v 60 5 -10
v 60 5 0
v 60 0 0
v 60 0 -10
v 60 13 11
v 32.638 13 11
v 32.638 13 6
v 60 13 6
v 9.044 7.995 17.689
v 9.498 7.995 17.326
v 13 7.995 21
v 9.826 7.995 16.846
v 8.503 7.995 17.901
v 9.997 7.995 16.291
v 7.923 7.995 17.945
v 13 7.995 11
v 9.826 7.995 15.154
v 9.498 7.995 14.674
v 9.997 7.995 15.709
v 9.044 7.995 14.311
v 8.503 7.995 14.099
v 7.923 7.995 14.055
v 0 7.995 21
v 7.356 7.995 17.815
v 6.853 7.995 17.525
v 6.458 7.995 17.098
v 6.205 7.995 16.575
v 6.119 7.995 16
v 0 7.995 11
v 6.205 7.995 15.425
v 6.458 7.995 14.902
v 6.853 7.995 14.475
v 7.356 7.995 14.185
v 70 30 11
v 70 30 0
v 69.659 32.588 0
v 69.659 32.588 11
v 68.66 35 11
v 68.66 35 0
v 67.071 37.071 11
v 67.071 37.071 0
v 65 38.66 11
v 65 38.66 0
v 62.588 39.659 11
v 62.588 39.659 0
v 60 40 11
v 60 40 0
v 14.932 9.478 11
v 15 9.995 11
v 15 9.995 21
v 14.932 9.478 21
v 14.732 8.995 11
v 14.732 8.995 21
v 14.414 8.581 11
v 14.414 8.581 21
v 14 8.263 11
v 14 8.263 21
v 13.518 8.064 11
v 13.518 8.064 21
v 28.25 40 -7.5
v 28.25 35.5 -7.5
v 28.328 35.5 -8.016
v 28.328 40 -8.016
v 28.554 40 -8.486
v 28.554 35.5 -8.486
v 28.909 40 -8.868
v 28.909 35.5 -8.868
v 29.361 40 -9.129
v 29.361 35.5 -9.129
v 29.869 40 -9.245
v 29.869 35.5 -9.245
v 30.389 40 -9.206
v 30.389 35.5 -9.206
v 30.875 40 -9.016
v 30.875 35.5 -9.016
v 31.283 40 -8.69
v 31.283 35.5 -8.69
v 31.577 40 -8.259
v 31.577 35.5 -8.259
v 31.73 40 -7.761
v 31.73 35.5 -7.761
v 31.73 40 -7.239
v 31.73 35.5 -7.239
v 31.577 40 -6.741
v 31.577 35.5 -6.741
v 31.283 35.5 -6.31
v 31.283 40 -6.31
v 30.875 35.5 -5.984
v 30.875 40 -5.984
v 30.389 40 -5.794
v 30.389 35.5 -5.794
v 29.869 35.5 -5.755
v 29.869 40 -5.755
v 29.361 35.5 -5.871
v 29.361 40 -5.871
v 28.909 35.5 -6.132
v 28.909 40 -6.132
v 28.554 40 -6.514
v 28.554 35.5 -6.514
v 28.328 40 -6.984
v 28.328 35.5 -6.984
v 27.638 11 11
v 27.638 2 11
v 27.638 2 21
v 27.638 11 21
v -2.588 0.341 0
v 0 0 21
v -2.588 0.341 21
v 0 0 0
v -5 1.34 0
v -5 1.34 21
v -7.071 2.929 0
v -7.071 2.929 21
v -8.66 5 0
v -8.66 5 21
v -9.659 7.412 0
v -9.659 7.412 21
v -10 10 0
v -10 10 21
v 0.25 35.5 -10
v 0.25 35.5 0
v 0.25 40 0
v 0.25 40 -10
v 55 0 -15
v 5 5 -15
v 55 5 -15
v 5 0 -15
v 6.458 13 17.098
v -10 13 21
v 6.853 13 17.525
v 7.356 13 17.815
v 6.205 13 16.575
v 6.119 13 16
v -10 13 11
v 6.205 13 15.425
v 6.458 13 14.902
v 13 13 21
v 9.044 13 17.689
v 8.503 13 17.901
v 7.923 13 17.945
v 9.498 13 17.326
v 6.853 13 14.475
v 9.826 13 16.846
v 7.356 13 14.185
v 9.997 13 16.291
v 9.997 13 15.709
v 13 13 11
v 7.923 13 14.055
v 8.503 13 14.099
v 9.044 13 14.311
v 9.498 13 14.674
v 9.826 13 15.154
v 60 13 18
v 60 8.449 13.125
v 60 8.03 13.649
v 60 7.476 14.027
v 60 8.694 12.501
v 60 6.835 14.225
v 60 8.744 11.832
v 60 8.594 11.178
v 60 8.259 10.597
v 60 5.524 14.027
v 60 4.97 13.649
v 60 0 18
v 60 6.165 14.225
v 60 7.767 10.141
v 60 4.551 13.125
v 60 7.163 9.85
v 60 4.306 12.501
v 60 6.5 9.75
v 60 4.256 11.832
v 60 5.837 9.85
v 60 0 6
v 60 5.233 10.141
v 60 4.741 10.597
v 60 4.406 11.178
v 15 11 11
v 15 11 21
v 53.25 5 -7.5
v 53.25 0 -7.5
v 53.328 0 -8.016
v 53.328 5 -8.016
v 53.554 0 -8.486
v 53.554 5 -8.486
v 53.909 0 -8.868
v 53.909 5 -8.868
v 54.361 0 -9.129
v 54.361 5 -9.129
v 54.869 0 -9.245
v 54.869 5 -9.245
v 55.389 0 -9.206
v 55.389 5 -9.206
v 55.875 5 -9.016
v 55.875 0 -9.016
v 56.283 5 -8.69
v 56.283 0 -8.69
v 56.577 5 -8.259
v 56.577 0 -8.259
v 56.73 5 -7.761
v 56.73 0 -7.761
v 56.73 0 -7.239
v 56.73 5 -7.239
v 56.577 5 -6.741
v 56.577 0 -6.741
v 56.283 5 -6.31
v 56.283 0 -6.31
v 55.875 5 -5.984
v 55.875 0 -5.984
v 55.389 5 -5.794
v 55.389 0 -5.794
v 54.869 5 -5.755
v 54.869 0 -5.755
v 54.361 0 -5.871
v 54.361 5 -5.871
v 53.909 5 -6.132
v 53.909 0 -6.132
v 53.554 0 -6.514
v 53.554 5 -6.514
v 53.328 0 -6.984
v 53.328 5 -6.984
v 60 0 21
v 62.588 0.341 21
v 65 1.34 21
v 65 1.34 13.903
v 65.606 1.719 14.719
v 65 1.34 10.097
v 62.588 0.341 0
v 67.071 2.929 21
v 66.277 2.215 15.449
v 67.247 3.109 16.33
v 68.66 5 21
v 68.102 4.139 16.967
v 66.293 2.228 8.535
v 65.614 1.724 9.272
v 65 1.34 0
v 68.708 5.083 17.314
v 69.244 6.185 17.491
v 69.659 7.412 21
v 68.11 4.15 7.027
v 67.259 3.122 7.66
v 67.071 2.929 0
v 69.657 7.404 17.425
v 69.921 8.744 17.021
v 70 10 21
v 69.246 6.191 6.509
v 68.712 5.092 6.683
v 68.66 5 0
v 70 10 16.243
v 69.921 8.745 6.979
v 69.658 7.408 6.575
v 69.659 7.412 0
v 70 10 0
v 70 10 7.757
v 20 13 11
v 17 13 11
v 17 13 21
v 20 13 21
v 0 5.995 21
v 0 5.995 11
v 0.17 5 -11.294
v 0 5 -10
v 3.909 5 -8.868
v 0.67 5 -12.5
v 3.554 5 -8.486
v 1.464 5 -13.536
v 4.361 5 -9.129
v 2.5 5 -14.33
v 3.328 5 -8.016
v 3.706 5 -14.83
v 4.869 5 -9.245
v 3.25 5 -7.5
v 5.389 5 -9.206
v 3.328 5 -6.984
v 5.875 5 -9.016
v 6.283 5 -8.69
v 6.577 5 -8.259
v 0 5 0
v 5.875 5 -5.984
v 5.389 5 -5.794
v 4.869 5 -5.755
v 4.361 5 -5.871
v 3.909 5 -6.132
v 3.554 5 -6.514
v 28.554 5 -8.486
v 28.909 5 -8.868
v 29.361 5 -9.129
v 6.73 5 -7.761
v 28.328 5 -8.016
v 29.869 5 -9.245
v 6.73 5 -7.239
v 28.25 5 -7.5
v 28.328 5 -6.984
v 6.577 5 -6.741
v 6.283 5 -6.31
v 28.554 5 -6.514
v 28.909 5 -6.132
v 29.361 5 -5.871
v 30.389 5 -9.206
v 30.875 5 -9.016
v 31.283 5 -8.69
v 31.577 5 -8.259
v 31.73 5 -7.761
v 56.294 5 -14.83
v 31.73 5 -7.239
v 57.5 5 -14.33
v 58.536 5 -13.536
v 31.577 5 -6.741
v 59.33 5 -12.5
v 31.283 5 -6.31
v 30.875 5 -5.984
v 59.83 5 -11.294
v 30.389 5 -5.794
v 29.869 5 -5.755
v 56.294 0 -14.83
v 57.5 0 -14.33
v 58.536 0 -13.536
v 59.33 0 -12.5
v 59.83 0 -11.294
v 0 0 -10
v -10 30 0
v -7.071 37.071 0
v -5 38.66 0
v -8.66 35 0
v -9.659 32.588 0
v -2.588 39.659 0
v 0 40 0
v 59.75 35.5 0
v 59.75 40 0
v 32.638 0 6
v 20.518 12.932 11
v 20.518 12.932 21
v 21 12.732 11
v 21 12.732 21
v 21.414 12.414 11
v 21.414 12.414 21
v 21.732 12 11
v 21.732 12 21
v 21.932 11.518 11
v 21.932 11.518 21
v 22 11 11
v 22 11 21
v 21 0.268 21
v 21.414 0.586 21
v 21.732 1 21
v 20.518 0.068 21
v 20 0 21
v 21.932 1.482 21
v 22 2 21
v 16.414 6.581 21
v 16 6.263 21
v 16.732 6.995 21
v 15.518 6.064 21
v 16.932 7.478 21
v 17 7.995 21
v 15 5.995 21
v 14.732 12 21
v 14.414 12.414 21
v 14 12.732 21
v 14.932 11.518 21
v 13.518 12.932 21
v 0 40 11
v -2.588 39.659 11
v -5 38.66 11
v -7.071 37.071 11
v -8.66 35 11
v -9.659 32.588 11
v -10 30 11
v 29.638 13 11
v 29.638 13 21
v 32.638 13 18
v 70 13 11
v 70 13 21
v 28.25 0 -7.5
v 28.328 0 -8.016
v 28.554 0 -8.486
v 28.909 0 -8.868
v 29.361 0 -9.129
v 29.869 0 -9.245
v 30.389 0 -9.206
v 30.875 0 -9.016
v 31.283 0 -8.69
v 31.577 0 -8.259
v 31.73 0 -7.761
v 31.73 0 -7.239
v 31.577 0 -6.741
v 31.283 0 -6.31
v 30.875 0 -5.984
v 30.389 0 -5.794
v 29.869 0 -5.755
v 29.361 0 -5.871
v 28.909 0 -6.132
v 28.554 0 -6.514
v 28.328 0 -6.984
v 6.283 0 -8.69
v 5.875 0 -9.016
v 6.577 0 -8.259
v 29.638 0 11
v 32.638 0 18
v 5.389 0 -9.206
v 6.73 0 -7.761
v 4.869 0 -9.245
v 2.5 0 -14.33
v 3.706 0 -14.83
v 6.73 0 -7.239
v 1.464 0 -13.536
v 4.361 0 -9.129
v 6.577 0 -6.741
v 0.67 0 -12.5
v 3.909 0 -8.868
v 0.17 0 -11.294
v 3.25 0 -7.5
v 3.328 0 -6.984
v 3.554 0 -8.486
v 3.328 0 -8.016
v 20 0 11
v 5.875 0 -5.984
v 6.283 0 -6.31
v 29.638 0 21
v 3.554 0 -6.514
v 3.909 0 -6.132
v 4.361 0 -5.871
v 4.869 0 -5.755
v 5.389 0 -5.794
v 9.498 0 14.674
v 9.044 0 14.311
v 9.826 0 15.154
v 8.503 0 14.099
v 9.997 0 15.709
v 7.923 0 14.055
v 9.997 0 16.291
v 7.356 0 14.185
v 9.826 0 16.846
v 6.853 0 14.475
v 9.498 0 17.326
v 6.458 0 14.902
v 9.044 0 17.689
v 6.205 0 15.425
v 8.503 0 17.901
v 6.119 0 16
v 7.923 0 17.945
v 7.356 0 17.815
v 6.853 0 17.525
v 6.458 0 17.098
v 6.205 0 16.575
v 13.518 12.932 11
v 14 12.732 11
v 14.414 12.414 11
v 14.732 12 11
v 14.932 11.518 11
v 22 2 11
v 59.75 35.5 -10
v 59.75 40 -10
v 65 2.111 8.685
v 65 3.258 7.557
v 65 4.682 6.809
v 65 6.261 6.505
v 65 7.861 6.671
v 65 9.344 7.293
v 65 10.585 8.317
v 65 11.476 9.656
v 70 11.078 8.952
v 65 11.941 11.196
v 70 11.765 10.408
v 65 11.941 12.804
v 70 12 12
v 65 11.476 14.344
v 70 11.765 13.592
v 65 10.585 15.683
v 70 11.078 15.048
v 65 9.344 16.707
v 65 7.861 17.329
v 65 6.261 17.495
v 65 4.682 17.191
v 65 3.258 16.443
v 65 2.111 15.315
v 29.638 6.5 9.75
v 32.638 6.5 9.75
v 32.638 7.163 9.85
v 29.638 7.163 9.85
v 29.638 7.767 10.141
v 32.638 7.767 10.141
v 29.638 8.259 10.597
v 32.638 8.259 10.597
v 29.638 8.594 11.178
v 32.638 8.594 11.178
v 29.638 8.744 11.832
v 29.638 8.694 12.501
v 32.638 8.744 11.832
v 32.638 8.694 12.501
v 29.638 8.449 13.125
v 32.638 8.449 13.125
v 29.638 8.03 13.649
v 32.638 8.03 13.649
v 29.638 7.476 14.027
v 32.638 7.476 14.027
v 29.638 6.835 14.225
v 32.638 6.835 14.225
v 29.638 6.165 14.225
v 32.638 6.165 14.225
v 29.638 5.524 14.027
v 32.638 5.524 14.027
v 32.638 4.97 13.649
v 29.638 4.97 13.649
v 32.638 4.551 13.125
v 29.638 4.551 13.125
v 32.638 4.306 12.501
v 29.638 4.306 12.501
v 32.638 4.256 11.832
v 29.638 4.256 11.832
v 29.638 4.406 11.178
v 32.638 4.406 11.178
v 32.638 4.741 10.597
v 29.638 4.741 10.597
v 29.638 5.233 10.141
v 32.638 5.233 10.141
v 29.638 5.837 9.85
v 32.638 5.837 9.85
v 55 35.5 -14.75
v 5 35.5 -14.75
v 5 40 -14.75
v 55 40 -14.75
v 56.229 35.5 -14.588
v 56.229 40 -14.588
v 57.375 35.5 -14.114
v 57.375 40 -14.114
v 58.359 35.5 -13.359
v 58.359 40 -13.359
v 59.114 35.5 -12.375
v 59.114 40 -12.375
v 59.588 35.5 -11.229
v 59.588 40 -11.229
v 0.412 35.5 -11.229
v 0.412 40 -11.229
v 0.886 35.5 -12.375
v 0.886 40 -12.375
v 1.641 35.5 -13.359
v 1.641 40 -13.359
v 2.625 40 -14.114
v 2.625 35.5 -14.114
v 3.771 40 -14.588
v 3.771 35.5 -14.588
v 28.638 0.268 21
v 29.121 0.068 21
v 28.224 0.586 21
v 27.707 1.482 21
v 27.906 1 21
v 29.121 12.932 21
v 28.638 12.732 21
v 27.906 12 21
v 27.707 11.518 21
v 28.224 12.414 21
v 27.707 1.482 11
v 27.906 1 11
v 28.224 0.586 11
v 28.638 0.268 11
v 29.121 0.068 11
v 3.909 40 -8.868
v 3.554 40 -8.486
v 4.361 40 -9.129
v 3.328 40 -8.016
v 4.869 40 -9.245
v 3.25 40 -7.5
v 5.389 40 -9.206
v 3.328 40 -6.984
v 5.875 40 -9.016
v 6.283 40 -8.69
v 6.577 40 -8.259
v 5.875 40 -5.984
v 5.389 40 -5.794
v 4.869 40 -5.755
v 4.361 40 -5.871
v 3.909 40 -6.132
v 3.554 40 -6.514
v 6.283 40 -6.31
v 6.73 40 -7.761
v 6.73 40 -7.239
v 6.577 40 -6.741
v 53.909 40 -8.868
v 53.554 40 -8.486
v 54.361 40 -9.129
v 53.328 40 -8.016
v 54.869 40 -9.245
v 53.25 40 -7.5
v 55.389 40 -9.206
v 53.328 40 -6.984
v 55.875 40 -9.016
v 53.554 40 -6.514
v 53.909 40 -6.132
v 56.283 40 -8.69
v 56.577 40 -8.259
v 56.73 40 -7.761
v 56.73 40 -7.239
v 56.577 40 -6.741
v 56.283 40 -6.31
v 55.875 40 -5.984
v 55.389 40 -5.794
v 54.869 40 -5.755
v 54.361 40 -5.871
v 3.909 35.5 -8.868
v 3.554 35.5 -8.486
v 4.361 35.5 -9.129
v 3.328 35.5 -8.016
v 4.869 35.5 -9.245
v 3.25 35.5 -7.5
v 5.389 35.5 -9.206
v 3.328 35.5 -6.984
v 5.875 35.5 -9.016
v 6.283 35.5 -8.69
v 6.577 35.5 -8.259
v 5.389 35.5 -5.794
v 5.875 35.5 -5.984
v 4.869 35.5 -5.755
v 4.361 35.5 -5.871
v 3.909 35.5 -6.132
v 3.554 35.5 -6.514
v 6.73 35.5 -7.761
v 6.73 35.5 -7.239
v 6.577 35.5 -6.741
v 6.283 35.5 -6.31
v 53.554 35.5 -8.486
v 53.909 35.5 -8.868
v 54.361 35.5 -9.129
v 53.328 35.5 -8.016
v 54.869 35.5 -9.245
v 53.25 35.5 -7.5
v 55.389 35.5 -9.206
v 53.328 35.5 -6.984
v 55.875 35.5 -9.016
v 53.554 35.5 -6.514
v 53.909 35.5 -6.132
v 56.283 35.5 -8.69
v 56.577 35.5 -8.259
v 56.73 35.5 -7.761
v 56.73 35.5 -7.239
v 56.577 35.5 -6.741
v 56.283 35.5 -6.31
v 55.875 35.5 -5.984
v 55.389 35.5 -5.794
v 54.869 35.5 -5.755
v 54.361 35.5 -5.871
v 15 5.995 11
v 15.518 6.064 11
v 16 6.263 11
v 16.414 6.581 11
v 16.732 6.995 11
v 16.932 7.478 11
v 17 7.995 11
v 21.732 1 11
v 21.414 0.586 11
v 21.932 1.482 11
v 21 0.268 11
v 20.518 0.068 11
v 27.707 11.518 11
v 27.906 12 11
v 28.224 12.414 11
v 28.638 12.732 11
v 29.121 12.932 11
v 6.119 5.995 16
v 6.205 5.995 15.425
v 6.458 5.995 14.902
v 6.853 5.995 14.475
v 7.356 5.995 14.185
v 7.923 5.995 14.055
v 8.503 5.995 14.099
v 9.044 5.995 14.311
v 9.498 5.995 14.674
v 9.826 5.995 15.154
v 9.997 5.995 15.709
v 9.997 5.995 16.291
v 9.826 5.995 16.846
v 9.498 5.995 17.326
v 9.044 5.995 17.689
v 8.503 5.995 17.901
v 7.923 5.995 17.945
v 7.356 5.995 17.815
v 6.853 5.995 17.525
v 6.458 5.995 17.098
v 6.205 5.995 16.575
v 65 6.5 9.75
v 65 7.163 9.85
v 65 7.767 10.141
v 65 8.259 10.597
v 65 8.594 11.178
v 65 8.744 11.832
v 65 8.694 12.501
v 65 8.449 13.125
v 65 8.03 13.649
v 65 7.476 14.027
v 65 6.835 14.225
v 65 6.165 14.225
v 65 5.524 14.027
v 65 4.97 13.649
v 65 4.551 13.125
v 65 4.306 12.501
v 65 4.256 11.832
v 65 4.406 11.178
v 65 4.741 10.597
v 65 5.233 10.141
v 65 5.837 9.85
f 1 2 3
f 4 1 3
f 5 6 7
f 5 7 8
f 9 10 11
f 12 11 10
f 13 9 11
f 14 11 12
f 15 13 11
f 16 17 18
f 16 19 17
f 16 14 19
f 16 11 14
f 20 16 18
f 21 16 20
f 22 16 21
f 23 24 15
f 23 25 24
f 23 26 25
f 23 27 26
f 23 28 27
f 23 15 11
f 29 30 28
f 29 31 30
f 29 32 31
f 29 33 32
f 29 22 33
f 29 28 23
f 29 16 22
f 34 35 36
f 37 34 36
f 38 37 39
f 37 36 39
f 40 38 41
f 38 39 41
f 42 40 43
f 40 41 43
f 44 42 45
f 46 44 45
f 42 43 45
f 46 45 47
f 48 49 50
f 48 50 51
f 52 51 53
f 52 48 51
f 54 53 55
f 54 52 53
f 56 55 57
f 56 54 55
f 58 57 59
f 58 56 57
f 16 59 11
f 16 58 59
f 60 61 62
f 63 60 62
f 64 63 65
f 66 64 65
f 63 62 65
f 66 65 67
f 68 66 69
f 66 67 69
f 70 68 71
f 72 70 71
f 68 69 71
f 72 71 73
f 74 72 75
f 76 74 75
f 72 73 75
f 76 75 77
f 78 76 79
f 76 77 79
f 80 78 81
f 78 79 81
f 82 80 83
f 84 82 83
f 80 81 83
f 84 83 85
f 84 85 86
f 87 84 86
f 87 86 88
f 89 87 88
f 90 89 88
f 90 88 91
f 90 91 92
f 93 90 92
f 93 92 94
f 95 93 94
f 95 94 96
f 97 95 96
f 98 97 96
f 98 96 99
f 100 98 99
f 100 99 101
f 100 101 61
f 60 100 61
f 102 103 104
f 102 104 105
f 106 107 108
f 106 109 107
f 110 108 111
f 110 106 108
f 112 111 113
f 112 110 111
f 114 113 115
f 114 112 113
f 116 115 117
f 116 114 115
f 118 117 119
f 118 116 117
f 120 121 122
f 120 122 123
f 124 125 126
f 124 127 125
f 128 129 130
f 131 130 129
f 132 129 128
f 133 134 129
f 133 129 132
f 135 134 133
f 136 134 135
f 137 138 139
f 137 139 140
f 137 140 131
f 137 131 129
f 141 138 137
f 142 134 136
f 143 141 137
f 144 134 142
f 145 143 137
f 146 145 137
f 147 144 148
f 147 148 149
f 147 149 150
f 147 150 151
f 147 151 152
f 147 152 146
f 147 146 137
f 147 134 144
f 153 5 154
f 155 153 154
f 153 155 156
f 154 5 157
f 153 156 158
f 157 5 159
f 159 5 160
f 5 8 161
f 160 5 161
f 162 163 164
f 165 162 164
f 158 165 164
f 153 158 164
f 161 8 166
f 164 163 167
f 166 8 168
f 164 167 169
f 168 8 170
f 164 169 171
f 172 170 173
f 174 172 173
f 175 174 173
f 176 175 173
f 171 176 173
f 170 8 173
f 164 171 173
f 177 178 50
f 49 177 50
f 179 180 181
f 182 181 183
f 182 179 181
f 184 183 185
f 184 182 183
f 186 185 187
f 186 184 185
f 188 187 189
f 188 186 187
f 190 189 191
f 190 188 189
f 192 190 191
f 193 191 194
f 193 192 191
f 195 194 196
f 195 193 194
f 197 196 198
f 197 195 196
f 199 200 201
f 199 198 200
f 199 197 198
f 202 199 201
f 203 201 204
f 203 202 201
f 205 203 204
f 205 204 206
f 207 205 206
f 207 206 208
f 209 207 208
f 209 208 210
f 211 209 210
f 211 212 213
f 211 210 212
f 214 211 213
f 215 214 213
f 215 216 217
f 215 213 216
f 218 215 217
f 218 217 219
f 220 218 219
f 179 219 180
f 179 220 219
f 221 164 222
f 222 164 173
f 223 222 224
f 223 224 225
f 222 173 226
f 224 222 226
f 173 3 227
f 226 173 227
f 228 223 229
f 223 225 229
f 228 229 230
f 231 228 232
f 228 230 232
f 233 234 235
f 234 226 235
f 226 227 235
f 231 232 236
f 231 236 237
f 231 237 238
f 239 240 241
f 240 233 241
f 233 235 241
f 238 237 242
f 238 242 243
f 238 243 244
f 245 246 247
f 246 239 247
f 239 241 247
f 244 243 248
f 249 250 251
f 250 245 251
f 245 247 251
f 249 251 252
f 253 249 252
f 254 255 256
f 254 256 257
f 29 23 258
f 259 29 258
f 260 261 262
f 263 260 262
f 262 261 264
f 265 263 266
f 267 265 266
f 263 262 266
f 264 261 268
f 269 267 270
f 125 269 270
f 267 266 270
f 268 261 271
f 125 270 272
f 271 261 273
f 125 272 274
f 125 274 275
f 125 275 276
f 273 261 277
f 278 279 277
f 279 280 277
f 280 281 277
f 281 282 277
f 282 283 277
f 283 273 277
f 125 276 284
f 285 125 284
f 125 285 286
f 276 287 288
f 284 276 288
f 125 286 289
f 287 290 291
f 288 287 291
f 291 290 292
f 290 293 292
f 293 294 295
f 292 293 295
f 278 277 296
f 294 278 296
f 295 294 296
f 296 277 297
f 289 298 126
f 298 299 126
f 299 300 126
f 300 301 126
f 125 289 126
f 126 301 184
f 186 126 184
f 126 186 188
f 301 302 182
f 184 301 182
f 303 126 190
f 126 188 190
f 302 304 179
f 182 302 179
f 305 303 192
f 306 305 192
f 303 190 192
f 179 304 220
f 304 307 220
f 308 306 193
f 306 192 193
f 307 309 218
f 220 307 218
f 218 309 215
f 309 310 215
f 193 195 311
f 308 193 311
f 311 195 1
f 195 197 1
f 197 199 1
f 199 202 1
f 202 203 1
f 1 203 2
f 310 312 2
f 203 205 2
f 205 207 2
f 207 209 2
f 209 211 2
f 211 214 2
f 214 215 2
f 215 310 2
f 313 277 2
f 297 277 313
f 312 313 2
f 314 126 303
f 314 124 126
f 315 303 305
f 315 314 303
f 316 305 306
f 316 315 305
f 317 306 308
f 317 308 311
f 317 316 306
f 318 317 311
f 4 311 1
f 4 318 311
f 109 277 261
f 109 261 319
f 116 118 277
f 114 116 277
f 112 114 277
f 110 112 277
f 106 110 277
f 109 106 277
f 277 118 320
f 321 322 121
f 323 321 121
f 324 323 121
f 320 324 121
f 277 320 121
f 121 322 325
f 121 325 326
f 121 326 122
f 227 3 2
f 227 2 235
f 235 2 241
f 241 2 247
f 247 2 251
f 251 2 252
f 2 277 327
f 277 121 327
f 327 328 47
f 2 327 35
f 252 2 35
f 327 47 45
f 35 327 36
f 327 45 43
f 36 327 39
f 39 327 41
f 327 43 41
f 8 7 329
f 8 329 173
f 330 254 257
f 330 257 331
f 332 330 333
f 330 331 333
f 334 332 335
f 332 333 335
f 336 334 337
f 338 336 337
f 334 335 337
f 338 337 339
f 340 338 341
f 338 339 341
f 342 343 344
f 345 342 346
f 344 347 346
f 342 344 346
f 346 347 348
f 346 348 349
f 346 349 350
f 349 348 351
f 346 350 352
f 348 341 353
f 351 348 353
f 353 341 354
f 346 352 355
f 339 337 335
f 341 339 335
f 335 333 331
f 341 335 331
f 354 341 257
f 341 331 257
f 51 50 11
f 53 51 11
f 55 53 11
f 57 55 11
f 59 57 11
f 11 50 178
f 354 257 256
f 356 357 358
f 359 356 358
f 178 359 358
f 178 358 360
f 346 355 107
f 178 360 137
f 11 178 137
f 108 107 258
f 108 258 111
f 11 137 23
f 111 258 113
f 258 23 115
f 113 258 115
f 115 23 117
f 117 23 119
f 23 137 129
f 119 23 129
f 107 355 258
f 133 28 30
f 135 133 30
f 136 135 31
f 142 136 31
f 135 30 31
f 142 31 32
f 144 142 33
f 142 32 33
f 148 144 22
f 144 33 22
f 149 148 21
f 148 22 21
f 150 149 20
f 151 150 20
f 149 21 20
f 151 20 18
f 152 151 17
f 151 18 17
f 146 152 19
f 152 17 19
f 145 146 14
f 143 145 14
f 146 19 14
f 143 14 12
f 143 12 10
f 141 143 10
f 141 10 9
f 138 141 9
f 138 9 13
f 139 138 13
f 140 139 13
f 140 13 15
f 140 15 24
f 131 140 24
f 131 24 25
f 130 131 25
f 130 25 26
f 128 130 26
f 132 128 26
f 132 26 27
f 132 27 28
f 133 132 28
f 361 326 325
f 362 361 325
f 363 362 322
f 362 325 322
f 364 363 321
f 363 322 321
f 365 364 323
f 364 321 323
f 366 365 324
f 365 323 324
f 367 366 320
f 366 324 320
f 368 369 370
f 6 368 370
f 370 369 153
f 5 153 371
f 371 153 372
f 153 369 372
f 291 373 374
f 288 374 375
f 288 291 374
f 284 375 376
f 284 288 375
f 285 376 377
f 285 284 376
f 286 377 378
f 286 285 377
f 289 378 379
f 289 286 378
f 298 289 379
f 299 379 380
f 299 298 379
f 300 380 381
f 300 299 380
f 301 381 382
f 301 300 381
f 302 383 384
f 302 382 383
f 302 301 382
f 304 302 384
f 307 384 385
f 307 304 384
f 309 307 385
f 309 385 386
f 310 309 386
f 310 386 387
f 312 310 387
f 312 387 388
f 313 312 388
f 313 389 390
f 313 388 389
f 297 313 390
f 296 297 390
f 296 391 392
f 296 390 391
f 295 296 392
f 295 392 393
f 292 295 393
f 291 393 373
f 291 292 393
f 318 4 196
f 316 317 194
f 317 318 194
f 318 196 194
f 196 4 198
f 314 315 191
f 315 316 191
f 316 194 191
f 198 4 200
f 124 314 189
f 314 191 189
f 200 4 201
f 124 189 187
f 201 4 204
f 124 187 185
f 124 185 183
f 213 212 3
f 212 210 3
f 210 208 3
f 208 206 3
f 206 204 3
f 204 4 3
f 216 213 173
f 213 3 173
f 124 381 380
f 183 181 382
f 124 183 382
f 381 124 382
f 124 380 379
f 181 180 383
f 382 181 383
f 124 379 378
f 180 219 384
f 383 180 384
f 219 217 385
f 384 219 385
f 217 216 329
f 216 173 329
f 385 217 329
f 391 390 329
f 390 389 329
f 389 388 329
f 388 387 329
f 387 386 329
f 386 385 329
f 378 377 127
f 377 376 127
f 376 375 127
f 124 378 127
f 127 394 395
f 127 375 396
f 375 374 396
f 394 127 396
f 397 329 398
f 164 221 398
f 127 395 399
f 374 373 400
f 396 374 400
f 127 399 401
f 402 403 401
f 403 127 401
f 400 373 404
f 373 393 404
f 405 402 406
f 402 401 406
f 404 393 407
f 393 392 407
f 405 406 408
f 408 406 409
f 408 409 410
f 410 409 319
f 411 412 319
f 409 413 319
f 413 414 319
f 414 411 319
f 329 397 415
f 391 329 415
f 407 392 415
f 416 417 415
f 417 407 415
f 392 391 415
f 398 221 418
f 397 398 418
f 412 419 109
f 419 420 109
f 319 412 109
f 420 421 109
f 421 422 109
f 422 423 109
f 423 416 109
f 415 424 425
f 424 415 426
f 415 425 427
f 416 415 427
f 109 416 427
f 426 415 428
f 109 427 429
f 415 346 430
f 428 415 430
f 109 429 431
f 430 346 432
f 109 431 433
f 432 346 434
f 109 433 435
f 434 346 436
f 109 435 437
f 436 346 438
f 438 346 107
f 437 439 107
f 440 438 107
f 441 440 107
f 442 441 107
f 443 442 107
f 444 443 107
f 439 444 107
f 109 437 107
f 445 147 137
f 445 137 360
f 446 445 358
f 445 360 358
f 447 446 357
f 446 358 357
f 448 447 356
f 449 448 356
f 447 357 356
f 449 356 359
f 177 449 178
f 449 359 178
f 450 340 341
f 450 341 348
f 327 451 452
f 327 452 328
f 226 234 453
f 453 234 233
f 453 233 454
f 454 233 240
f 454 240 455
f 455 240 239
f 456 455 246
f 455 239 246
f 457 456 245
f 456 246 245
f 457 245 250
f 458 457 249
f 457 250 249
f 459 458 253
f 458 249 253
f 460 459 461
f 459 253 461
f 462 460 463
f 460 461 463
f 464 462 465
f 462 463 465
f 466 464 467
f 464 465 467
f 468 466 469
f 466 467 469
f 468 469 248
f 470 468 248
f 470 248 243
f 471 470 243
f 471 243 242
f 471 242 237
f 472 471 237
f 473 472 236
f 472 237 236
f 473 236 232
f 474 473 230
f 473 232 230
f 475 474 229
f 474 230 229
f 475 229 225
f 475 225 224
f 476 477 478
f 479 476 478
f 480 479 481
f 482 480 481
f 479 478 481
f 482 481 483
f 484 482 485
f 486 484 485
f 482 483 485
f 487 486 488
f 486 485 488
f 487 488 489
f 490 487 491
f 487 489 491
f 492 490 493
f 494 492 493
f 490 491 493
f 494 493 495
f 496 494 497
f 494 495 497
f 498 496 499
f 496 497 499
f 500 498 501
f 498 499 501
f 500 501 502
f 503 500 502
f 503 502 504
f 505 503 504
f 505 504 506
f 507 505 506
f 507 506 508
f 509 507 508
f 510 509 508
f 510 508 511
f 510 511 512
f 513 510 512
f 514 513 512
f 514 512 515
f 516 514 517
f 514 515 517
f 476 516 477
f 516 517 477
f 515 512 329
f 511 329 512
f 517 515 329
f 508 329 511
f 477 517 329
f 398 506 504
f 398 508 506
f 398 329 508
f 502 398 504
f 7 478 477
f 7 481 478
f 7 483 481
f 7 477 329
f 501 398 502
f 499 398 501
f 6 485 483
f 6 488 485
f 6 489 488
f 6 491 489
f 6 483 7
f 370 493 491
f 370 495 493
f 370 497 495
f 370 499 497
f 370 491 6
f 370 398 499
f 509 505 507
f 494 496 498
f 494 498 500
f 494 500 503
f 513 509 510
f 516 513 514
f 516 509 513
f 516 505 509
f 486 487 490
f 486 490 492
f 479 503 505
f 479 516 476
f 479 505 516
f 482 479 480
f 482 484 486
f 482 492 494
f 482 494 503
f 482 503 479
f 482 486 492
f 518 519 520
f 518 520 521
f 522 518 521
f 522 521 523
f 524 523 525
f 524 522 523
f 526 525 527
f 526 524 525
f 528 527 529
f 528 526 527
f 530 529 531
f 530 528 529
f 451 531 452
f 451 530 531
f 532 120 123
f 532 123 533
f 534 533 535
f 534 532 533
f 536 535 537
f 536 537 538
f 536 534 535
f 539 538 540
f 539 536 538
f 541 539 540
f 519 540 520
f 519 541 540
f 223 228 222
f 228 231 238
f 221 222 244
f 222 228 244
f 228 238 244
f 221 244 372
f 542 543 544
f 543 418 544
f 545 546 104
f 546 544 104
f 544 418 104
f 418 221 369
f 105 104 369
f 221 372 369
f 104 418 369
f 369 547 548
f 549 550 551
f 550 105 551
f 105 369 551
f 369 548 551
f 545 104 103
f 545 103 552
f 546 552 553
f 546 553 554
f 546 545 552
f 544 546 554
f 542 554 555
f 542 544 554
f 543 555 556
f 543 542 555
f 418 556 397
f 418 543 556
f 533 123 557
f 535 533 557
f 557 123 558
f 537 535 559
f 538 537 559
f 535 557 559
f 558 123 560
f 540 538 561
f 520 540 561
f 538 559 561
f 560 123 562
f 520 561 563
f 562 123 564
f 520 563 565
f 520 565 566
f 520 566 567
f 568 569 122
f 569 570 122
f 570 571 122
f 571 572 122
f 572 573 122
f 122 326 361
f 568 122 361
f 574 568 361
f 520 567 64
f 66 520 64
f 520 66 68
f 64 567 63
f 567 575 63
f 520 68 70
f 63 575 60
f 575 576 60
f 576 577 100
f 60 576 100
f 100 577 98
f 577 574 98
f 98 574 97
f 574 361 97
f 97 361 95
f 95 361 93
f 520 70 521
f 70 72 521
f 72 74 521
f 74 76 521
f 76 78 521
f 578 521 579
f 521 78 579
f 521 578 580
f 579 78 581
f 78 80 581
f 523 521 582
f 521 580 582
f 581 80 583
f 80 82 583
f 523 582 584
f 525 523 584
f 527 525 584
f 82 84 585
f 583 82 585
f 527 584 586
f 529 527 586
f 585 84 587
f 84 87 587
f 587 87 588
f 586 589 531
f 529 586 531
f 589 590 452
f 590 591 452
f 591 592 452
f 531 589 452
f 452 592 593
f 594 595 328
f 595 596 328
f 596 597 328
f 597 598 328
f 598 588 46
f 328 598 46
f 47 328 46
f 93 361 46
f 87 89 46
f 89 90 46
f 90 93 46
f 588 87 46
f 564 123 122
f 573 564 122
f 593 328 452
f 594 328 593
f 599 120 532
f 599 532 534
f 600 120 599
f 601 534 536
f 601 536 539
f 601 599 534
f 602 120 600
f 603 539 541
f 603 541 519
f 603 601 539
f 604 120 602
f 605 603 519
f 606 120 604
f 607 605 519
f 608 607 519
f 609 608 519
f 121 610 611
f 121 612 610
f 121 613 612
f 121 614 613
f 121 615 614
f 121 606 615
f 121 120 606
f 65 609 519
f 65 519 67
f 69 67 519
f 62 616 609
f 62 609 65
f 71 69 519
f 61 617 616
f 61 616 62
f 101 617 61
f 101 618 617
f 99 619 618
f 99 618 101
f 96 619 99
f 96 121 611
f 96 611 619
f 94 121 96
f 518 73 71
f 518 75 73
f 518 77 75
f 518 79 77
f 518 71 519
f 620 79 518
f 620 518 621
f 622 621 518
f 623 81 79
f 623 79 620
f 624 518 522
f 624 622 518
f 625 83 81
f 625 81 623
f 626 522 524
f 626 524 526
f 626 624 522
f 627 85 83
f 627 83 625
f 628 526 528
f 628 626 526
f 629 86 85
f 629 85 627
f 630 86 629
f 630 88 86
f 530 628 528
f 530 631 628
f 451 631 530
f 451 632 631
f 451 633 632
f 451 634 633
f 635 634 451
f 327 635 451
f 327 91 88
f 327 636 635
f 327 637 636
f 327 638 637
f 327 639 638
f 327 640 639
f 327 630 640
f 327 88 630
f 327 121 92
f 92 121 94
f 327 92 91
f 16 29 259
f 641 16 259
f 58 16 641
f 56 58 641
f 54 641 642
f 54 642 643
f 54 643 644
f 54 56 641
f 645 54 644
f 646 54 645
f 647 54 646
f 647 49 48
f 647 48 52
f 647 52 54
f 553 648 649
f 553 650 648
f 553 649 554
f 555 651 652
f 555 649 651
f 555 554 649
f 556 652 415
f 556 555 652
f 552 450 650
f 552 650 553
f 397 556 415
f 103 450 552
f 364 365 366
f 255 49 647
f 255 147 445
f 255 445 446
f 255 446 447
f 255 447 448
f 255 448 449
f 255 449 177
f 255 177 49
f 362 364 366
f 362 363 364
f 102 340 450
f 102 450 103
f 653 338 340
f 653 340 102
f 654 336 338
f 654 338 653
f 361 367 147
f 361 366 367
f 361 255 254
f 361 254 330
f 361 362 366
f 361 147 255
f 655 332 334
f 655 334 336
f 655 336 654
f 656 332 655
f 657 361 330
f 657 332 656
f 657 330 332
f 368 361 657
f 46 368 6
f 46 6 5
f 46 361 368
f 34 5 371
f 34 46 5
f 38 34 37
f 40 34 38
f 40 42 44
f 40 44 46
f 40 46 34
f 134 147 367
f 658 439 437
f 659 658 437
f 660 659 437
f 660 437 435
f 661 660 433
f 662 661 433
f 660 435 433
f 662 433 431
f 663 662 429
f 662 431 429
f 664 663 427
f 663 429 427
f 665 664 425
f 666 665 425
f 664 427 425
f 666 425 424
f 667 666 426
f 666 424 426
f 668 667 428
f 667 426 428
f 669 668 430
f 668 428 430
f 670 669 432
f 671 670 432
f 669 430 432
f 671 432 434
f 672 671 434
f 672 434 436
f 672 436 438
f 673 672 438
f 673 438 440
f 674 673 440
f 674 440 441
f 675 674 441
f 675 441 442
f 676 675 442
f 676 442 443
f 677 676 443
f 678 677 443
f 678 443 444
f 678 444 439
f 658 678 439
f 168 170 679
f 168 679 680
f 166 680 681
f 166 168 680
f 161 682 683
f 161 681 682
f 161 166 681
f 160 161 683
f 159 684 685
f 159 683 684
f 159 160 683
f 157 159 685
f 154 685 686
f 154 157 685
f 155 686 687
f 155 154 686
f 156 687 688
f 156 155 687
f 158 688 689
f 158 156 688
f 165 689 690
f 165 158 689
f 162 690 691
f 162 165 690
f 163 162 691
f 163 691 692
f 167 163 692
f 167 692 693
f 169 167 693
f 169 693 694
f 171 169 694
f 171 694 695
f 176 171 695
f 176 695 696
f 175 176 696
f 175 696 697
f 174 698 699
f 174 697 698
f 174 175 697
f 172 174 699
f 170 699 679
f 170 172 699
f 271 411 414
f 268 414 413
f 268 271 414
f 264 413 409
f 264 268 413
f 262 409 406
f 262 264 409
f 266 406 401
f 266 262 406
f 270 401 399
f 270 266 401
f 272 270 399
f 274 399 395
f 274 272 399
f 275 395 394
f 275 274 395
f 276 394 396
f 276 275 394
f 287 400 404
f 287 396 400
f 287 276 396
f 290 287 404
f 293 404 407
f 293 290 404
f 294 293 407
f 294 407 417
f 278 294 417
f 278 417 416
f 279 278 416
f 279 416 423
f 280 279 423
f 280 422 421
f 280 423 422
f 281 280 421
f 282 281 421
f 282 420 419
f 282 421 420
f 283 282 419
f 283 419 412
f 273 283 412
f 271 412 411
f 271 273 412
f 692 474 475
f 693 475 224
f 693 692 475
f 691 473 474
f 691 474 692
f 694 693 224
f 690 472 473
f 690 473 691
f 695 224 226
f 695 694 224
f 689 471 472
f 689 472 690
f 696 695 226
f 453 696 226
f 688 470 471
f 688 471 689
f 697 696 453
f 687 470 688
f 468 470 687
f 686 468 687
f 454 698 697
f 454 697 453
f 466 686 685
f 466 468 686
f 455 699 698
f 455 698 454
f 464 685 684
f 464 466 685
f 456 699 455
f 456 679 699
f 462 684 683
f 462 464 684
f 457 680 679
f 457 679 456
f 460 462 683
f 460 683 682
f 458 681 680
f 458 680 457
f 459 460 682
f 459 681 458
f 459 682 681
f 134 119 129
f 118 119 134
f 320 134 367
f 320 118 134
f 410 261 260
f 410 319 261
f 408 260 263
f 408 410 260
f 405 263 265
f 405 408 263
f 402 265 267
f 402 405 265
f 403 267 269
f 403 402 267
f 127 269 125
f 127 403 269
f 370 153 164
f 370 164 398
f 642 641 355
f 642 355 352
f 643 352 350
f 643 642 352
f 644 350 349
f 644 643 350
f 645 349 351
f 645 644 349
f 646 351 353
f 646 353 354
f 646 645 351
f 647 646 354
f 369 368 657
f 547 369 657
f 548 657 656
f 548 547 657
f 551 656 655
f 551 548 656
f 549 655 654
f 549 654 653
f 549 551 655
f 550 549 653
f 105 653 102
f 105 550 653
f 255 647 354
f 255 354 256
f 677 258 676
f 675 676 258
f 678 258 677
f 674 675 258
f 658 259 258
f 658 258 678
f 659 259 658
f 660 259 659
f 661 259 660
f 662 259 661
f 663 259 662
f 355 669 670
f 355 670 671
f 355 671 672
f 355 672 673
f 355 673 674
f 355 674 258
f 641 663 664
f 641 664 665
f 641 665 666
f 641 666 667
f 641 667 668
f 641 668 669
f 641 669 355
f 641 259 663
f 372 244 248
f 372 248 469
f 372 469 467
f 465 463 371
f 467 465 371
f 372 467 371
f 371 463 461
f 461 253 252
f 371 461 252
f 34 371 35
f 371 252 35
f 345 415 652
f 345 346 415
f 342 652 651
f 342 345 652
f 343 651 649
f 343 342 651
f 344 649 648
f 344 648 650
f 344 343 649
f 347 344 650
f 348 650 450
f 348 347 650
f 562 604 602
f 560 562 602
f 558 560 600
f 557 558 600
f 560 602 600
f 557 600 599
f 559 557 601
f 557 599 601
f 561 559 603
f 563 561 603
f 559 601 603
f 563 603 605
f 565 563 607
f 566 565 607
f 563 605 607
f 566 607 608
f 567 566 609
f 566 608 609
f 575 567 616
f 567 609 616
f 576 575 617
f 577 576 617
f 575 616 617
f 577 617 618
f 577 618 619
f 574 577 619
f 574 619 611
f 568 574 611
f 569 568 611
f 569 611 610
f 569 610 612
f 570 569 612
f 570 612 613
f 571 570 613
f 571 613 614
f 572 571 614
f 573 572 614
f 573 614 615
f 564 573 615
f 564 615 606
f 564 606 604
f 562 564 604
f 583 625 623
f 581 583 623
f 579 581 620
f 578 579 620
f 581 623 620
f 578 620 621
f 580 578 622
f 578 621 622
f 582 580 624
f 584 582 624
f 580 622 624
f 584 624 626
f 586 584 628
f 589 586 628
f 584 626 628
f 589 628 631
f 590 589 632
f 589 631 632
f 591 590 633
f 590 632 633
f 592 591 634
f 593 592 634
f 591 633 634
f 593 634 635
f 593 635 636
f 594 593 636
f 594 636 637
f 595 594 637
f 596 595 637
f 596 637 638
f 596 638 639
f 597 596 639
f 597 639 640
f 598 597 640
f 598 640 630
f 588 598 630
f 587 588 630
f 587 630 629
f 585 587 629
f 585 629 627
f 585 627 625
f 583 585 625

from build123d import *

# Parameters (mm, degrees)
BOSS_EXTRUDE1_DEPTH      = 11
SKETCH2_W                = 60
SKETCH2_H                = 5
BOSS_EXTRUDE2_DEPTH      = 26
FILLET1_R                = 5
SKETCH4_R                = 1.75
CUT_EXTRUDE2_DEPTH       = 25
CUT_EXTRUDE3_DEPTH       = 25
FILLET1_OF_MIRROR1_R     = 5
CUT_EXTRUDE7_DEPTH       = 0.5
BOSS_EXTRUDE3_DEPTH      = 10
SKETCH20_R               = 1.95
CUT_EXTRUDE10_DEPTH      = 14
FILLET2_R                = 2
SKETCH21_W               = 5
SKETCH21_H               = 13
BOSS_EXTRUDE4_DEPTH      = 10
FILLET3_R                = 2
FILLET4_R                = 2
SKETCH24_W               = 27.361524014
SKETCH24_H               = 13
CUT_EXTRUDE12_DEPTH      = 5
SKETCH22_R               = 2.25
CUT_EXTRUDE11_DEPTH      = 38.361524014
CUT_EXTRUDE11_DEPTH_BACK = 3
SKETCH23_R               = 5.5
CUT_EXTRUDE13_DEPTH      = 5
BOSS_EXTRUDE5_DEPTH      = 3
FILLET5_R                = 2


with BuildPart() as part:
    # Sketch1 → Boss-Extrude1 (new body)
    with BuildSketch(Plane.XY):
        with BuildLine():
            Line((60, 35), (0, 35))
            Line((0, 35), (0, 40))
            ThreePointArc((0, 40), (-7.071067812, 37.071067812), (-10, 30))
            Line((-10, 30), (-10, 10))
            ThreePointArc((-10, 10), (-7.071067812, 2.928932188), (0, 0))
            Line((0, 0), (60, 0))
            ThreePointArc((60, 0), (67.071067812, 2.928932188), (70, 10))
            Line((70, 10), (70, 30))
            ThreePointArc((70, 30), (67.071067812, 37.071067812), (60, 40))
            Line((60, 40), (60, 35))
        make_face()
    extrude(amount=BOSS_EXTRUDE1_DEPTH)

    # Sketch2 → Boss-Extrude2 (add)
    with BuildSketch(Plane.XY.offset(11)):
        with Locations((30, 37.5)):
            Rectangle(SKETCH2_W, SKETCH2_H)
    boss_extrude2 = extrude(amount=-BOSS_EXTRUDE2_DEPTH)

    # Fillet1
    fillet1_edges = [part.edges().sort_by_distance(p)[0] for p in [
        (0, 37.5, -15),
        (60, 37.5, -15),
    ]]
    fillet(fillet1_edges, radius=FILLET1_R)

    # Sketch4 → Cut-Extrude2 (cut)
    with BuildSketch(Plane(origin=(0, 35, 0), x_dir=(-1, 0, 0), z_dir=(0, -1, 0))):
        with Locations((-55, 7.5)):
            Circle(SKETCH4_R)
        with Locations((-30, 7.5)):
            Circle(SKETCH4_R)
        with Locations((-5, 7.5)):
            Circle(SKETCH4_R)
    cut_extrude2 = extrude(amount=-CUT_EXTRUDE2_DEPTH, mode=Mode.SUBTRACT)

    # Sketch5 → Cut-Extrude3 (cut)
    with BuildSketch(Plane.XZ.offset(-35)):
        with BuildLine():
            Line((5, -14.75), (55, -14.75))
            ThreePointArc((55, -14.75), (58.358757211, -13.358757211), (59.75, -10))
            Line((59.75, -10), (59.75, -0.25))
            Line((59.75, -0.25), (59.75, 0))
            Line((59.75, 0), (60, 0))
            Line((60, 0), (60, -10))
            ThreePointArc((60, -10), (58.535533906, -13.535533906), (55, -15))
            Line((55, -15), (5, -15))
            ThreePointArc((5, -15), (1.464466094, -13.535533906), (0, -10))
            Line((0, -10), (0, 0))
            Line((0, 0), (0.25, 0))
            Line((0.25, 0), (0.25, -0.25))
            Line((0.25, -0.25), (0.25, -10))
            ThreePointArc((0.25, -10), (1.641242789, -13.358757211), (5, -14.75))
        make_face()
    extrude(amount=-CUT_EXTRUDE3_DEPTH, mode=Mode.SUBTRACT)

    # Mirror1: Boss-Extrude2, Cut-Extrude2 across plane
    add(boss_extrude2.mirror(Plane(origin=(0, 20, 0), x_dir=(0, 0, 1), z_dir=(0, -1, 0))))
    add(cut_extrude2.mirror(Plane(origin=(0, 20, 0), x_dir=(0, 0, 1), z_dir=(0, -1, 0))), mode=Mode.SUBTRACT)

    # Fillet1 of Mirror1
    fillet1_of_mirror1_edges = [part.edges().sort_by_distance(p)[0] for p in [
        (0, 2.5, -15),
        (60, 2.5, -15),
    ]]
    fillet(fillet1_of_mirror1_edges, radius=FILLET1_OF_MIRROR1_R)

    # Sketch16 → Cut-Extrude7 (cut)
    with BuildSketch(Plane.XZ.offset(-35)):
        with BuildLine():
            Line((0.25, 0), (0.25, -10))
            ThreePointArc((0.25, -10), (1.641242789, -13.358757211), (5, -14.75))
            Line((5, -14.75), (55, -14.75))
            ThreePointArc((55, -14.75), (58.358757211, -13.358757211), (59.75, -10))
            Line((59.75, -10), (59.75, 0))
            Line((59.75, 0), (0.25, 0))
        make_face()
    extrude(amount=-CUT_EXTRUDE7_DEPTH, mode=Mode.SUBTRACT)

    # Sketch19 → Boss-Extrude3 (add)
    with BuildSketch(Plane.XY.offset(11)):
        with BuildLine():
            Line((-10, 13), (15, 13))
            Line((15, 13), (15, 9.995431427))
            ThreePointArc((15, 9.995431427), (14.414213562, 8.581217864), (13, 7.995431427))
            Line((13, 7.995431427), (0, 7.995431427))
            Line((0, 7.995431427), (0, 5.995431427))
            Line((0, 5.995431427), (15, 5.995431427))
            ThreePointArc((15, 5.995431427), (16.414213562, 6.581217864), (17, 7.995431427))
            Line((17, 7.995431427), (17, 13))
            Line((17, 13), (22, 13))
            Line((22, 13), (22, 0))
            Line((22, 0), (0, 0))
            ThreePointArc((0, 0), (-7.071067812, 2.928932188), (-10, 10))
            Line((-10, 10), (-10, 13))
        make_face()
    extrude(amount=BOSS_EXTRUDE3_DEPTH)

    # Sketch20 → Cut-Extrude10 (cut)
    with BuildSketch(Plane(origin=(0, 0, 0), x_dir=(-1, 0, 0), z_dir=(0, -1, 0))):
        with Locations((-8.068741, -16)):
            Circle(SKETCH20_R)
    extrude(amount=-CUT_EXTRUDE10_DEPTH, mode=Mode.SUBTRACT)

    # Fillet2
    fillet2_edges = [part.edges().sort_by_distance(p)[0] for p in [
        (15, 13, 16),
    ]]
    fillet(fillet2_edges, radius=FILLET2_R)

    # Sketch21 → Boss-Extrude4 (add)
    with BuildSketch(Plane.XY.offset(11)):
        with BuildLine():
            Line((70, 13), (60, 13))
            Line((60, 13), (60, 0))
            ThreePointArc((60, 0), (67.071067812, 2.928932188), (70, 10))
            Line((70, 10), (70, 13))
        make_face()
        with Locations((30.138475986, 6.5)):
            Rectangle(SKETCH21_W, SKETCH21_H)
    extrude(amount=BOSS_EXTRUDE4_DEPTH)

    # Fillet3
    fillet3_edges = [part.edges().sort_by_distance(p)[0] for p in [
        (27.638475986, 13, 16),
    ]]
    fillet(fillet3_edges, radius=FILLET3_R)

    # Fillet4
    fillet4_edges = [part.edges().sort_by_distance(p)[0] for p in [
        (27.638475986, 0, 16),
    ]]
    fillet(fillet4_edges, radius=FILLET4_R)

    # Sketch24 → Cut-Extrude12 (cut)
    with BuildSketch(Plane.XY.offset(11)):
        with Locations((46.319237993, 6.5)):
            Rectangle(SKETCH24_W, SKETCH24_H)
    extrude(amount=-CUT_EXTRUDE12_DEPTH, mode=Mode.SUBTRACT)

    # Sketch22 → Cut-Extrude11 (cut, two sides)
    with BuildSketch(Plane(origin=(32.638475986, 0, 0), x_dir=(0, 0, -1), z_dir=(1, 0, 0))) as cut_extrude11_sk:
        with Locations((-12, 6.5)):
            Circle(SKETCH22_R)
    extrude(amount=CUT_EXTRUDE11_DEPTH, mode=Mode.SUBTRACT)
    extrude(cut_extrude11_sk.sketch, amount=-CUT_EXTRUDE11_DEPTH_BACK, mode=Mode.SUBTRACT)

    # Sketch23 → Cut-Extrude13 (cut)
    with BuildSketch(Plane(origin=(70, 0, 0), x_dir=(0, 0, -1), z_dir=(1, 0, 0))):
        with Locations((-12, 6.5)):
            Circle(SKETCH23_R)
    extrude(amount=-CUT_EXTRUDE13_DEPTH, mode=Mode.SUBTRACT)

    # Sketch25 → Boss-Extrude5 (add)
    with BuildSketch(Plane.XY.offset(21)):
        with BuildLine():
            Line((60, 0), (32.638475986, 0))
            Line((32.638475986, 0), (29.638475986, 0))
            ThreePointArc((29.638475986, 0), (28.224262424, 0.585786438), (27.638475986, 2))
            Line((27.638475986, 2), (27.638475986, 11))
            ThreePointArc((27.638475986, 11), (28.224262424, 12.414213562), (29.638475986, 13))
            Line((29.638475986, 13), (32.638475986, 13))
            Line((32.638475986, 13), (60, 13))
            Line((60, 13), (70, 13))
            Line((70, 13), (70, 10))
            ThreePointArc((70, 10), (67.071067812, 2.928932188), (60, 0))
        make_face()
    extrude(amount=-BOSS_EXTRUDE5_DEPTH)

    # Fillet5
    fillet5_edges = [part.edges().sort_by_distance(p)[0] for p in [
        (22, 0, 16),
        (22, 13, 16),
    ]]
    fillet(fillet5_edges, radius=FILLET5_R)


solid = part.part
